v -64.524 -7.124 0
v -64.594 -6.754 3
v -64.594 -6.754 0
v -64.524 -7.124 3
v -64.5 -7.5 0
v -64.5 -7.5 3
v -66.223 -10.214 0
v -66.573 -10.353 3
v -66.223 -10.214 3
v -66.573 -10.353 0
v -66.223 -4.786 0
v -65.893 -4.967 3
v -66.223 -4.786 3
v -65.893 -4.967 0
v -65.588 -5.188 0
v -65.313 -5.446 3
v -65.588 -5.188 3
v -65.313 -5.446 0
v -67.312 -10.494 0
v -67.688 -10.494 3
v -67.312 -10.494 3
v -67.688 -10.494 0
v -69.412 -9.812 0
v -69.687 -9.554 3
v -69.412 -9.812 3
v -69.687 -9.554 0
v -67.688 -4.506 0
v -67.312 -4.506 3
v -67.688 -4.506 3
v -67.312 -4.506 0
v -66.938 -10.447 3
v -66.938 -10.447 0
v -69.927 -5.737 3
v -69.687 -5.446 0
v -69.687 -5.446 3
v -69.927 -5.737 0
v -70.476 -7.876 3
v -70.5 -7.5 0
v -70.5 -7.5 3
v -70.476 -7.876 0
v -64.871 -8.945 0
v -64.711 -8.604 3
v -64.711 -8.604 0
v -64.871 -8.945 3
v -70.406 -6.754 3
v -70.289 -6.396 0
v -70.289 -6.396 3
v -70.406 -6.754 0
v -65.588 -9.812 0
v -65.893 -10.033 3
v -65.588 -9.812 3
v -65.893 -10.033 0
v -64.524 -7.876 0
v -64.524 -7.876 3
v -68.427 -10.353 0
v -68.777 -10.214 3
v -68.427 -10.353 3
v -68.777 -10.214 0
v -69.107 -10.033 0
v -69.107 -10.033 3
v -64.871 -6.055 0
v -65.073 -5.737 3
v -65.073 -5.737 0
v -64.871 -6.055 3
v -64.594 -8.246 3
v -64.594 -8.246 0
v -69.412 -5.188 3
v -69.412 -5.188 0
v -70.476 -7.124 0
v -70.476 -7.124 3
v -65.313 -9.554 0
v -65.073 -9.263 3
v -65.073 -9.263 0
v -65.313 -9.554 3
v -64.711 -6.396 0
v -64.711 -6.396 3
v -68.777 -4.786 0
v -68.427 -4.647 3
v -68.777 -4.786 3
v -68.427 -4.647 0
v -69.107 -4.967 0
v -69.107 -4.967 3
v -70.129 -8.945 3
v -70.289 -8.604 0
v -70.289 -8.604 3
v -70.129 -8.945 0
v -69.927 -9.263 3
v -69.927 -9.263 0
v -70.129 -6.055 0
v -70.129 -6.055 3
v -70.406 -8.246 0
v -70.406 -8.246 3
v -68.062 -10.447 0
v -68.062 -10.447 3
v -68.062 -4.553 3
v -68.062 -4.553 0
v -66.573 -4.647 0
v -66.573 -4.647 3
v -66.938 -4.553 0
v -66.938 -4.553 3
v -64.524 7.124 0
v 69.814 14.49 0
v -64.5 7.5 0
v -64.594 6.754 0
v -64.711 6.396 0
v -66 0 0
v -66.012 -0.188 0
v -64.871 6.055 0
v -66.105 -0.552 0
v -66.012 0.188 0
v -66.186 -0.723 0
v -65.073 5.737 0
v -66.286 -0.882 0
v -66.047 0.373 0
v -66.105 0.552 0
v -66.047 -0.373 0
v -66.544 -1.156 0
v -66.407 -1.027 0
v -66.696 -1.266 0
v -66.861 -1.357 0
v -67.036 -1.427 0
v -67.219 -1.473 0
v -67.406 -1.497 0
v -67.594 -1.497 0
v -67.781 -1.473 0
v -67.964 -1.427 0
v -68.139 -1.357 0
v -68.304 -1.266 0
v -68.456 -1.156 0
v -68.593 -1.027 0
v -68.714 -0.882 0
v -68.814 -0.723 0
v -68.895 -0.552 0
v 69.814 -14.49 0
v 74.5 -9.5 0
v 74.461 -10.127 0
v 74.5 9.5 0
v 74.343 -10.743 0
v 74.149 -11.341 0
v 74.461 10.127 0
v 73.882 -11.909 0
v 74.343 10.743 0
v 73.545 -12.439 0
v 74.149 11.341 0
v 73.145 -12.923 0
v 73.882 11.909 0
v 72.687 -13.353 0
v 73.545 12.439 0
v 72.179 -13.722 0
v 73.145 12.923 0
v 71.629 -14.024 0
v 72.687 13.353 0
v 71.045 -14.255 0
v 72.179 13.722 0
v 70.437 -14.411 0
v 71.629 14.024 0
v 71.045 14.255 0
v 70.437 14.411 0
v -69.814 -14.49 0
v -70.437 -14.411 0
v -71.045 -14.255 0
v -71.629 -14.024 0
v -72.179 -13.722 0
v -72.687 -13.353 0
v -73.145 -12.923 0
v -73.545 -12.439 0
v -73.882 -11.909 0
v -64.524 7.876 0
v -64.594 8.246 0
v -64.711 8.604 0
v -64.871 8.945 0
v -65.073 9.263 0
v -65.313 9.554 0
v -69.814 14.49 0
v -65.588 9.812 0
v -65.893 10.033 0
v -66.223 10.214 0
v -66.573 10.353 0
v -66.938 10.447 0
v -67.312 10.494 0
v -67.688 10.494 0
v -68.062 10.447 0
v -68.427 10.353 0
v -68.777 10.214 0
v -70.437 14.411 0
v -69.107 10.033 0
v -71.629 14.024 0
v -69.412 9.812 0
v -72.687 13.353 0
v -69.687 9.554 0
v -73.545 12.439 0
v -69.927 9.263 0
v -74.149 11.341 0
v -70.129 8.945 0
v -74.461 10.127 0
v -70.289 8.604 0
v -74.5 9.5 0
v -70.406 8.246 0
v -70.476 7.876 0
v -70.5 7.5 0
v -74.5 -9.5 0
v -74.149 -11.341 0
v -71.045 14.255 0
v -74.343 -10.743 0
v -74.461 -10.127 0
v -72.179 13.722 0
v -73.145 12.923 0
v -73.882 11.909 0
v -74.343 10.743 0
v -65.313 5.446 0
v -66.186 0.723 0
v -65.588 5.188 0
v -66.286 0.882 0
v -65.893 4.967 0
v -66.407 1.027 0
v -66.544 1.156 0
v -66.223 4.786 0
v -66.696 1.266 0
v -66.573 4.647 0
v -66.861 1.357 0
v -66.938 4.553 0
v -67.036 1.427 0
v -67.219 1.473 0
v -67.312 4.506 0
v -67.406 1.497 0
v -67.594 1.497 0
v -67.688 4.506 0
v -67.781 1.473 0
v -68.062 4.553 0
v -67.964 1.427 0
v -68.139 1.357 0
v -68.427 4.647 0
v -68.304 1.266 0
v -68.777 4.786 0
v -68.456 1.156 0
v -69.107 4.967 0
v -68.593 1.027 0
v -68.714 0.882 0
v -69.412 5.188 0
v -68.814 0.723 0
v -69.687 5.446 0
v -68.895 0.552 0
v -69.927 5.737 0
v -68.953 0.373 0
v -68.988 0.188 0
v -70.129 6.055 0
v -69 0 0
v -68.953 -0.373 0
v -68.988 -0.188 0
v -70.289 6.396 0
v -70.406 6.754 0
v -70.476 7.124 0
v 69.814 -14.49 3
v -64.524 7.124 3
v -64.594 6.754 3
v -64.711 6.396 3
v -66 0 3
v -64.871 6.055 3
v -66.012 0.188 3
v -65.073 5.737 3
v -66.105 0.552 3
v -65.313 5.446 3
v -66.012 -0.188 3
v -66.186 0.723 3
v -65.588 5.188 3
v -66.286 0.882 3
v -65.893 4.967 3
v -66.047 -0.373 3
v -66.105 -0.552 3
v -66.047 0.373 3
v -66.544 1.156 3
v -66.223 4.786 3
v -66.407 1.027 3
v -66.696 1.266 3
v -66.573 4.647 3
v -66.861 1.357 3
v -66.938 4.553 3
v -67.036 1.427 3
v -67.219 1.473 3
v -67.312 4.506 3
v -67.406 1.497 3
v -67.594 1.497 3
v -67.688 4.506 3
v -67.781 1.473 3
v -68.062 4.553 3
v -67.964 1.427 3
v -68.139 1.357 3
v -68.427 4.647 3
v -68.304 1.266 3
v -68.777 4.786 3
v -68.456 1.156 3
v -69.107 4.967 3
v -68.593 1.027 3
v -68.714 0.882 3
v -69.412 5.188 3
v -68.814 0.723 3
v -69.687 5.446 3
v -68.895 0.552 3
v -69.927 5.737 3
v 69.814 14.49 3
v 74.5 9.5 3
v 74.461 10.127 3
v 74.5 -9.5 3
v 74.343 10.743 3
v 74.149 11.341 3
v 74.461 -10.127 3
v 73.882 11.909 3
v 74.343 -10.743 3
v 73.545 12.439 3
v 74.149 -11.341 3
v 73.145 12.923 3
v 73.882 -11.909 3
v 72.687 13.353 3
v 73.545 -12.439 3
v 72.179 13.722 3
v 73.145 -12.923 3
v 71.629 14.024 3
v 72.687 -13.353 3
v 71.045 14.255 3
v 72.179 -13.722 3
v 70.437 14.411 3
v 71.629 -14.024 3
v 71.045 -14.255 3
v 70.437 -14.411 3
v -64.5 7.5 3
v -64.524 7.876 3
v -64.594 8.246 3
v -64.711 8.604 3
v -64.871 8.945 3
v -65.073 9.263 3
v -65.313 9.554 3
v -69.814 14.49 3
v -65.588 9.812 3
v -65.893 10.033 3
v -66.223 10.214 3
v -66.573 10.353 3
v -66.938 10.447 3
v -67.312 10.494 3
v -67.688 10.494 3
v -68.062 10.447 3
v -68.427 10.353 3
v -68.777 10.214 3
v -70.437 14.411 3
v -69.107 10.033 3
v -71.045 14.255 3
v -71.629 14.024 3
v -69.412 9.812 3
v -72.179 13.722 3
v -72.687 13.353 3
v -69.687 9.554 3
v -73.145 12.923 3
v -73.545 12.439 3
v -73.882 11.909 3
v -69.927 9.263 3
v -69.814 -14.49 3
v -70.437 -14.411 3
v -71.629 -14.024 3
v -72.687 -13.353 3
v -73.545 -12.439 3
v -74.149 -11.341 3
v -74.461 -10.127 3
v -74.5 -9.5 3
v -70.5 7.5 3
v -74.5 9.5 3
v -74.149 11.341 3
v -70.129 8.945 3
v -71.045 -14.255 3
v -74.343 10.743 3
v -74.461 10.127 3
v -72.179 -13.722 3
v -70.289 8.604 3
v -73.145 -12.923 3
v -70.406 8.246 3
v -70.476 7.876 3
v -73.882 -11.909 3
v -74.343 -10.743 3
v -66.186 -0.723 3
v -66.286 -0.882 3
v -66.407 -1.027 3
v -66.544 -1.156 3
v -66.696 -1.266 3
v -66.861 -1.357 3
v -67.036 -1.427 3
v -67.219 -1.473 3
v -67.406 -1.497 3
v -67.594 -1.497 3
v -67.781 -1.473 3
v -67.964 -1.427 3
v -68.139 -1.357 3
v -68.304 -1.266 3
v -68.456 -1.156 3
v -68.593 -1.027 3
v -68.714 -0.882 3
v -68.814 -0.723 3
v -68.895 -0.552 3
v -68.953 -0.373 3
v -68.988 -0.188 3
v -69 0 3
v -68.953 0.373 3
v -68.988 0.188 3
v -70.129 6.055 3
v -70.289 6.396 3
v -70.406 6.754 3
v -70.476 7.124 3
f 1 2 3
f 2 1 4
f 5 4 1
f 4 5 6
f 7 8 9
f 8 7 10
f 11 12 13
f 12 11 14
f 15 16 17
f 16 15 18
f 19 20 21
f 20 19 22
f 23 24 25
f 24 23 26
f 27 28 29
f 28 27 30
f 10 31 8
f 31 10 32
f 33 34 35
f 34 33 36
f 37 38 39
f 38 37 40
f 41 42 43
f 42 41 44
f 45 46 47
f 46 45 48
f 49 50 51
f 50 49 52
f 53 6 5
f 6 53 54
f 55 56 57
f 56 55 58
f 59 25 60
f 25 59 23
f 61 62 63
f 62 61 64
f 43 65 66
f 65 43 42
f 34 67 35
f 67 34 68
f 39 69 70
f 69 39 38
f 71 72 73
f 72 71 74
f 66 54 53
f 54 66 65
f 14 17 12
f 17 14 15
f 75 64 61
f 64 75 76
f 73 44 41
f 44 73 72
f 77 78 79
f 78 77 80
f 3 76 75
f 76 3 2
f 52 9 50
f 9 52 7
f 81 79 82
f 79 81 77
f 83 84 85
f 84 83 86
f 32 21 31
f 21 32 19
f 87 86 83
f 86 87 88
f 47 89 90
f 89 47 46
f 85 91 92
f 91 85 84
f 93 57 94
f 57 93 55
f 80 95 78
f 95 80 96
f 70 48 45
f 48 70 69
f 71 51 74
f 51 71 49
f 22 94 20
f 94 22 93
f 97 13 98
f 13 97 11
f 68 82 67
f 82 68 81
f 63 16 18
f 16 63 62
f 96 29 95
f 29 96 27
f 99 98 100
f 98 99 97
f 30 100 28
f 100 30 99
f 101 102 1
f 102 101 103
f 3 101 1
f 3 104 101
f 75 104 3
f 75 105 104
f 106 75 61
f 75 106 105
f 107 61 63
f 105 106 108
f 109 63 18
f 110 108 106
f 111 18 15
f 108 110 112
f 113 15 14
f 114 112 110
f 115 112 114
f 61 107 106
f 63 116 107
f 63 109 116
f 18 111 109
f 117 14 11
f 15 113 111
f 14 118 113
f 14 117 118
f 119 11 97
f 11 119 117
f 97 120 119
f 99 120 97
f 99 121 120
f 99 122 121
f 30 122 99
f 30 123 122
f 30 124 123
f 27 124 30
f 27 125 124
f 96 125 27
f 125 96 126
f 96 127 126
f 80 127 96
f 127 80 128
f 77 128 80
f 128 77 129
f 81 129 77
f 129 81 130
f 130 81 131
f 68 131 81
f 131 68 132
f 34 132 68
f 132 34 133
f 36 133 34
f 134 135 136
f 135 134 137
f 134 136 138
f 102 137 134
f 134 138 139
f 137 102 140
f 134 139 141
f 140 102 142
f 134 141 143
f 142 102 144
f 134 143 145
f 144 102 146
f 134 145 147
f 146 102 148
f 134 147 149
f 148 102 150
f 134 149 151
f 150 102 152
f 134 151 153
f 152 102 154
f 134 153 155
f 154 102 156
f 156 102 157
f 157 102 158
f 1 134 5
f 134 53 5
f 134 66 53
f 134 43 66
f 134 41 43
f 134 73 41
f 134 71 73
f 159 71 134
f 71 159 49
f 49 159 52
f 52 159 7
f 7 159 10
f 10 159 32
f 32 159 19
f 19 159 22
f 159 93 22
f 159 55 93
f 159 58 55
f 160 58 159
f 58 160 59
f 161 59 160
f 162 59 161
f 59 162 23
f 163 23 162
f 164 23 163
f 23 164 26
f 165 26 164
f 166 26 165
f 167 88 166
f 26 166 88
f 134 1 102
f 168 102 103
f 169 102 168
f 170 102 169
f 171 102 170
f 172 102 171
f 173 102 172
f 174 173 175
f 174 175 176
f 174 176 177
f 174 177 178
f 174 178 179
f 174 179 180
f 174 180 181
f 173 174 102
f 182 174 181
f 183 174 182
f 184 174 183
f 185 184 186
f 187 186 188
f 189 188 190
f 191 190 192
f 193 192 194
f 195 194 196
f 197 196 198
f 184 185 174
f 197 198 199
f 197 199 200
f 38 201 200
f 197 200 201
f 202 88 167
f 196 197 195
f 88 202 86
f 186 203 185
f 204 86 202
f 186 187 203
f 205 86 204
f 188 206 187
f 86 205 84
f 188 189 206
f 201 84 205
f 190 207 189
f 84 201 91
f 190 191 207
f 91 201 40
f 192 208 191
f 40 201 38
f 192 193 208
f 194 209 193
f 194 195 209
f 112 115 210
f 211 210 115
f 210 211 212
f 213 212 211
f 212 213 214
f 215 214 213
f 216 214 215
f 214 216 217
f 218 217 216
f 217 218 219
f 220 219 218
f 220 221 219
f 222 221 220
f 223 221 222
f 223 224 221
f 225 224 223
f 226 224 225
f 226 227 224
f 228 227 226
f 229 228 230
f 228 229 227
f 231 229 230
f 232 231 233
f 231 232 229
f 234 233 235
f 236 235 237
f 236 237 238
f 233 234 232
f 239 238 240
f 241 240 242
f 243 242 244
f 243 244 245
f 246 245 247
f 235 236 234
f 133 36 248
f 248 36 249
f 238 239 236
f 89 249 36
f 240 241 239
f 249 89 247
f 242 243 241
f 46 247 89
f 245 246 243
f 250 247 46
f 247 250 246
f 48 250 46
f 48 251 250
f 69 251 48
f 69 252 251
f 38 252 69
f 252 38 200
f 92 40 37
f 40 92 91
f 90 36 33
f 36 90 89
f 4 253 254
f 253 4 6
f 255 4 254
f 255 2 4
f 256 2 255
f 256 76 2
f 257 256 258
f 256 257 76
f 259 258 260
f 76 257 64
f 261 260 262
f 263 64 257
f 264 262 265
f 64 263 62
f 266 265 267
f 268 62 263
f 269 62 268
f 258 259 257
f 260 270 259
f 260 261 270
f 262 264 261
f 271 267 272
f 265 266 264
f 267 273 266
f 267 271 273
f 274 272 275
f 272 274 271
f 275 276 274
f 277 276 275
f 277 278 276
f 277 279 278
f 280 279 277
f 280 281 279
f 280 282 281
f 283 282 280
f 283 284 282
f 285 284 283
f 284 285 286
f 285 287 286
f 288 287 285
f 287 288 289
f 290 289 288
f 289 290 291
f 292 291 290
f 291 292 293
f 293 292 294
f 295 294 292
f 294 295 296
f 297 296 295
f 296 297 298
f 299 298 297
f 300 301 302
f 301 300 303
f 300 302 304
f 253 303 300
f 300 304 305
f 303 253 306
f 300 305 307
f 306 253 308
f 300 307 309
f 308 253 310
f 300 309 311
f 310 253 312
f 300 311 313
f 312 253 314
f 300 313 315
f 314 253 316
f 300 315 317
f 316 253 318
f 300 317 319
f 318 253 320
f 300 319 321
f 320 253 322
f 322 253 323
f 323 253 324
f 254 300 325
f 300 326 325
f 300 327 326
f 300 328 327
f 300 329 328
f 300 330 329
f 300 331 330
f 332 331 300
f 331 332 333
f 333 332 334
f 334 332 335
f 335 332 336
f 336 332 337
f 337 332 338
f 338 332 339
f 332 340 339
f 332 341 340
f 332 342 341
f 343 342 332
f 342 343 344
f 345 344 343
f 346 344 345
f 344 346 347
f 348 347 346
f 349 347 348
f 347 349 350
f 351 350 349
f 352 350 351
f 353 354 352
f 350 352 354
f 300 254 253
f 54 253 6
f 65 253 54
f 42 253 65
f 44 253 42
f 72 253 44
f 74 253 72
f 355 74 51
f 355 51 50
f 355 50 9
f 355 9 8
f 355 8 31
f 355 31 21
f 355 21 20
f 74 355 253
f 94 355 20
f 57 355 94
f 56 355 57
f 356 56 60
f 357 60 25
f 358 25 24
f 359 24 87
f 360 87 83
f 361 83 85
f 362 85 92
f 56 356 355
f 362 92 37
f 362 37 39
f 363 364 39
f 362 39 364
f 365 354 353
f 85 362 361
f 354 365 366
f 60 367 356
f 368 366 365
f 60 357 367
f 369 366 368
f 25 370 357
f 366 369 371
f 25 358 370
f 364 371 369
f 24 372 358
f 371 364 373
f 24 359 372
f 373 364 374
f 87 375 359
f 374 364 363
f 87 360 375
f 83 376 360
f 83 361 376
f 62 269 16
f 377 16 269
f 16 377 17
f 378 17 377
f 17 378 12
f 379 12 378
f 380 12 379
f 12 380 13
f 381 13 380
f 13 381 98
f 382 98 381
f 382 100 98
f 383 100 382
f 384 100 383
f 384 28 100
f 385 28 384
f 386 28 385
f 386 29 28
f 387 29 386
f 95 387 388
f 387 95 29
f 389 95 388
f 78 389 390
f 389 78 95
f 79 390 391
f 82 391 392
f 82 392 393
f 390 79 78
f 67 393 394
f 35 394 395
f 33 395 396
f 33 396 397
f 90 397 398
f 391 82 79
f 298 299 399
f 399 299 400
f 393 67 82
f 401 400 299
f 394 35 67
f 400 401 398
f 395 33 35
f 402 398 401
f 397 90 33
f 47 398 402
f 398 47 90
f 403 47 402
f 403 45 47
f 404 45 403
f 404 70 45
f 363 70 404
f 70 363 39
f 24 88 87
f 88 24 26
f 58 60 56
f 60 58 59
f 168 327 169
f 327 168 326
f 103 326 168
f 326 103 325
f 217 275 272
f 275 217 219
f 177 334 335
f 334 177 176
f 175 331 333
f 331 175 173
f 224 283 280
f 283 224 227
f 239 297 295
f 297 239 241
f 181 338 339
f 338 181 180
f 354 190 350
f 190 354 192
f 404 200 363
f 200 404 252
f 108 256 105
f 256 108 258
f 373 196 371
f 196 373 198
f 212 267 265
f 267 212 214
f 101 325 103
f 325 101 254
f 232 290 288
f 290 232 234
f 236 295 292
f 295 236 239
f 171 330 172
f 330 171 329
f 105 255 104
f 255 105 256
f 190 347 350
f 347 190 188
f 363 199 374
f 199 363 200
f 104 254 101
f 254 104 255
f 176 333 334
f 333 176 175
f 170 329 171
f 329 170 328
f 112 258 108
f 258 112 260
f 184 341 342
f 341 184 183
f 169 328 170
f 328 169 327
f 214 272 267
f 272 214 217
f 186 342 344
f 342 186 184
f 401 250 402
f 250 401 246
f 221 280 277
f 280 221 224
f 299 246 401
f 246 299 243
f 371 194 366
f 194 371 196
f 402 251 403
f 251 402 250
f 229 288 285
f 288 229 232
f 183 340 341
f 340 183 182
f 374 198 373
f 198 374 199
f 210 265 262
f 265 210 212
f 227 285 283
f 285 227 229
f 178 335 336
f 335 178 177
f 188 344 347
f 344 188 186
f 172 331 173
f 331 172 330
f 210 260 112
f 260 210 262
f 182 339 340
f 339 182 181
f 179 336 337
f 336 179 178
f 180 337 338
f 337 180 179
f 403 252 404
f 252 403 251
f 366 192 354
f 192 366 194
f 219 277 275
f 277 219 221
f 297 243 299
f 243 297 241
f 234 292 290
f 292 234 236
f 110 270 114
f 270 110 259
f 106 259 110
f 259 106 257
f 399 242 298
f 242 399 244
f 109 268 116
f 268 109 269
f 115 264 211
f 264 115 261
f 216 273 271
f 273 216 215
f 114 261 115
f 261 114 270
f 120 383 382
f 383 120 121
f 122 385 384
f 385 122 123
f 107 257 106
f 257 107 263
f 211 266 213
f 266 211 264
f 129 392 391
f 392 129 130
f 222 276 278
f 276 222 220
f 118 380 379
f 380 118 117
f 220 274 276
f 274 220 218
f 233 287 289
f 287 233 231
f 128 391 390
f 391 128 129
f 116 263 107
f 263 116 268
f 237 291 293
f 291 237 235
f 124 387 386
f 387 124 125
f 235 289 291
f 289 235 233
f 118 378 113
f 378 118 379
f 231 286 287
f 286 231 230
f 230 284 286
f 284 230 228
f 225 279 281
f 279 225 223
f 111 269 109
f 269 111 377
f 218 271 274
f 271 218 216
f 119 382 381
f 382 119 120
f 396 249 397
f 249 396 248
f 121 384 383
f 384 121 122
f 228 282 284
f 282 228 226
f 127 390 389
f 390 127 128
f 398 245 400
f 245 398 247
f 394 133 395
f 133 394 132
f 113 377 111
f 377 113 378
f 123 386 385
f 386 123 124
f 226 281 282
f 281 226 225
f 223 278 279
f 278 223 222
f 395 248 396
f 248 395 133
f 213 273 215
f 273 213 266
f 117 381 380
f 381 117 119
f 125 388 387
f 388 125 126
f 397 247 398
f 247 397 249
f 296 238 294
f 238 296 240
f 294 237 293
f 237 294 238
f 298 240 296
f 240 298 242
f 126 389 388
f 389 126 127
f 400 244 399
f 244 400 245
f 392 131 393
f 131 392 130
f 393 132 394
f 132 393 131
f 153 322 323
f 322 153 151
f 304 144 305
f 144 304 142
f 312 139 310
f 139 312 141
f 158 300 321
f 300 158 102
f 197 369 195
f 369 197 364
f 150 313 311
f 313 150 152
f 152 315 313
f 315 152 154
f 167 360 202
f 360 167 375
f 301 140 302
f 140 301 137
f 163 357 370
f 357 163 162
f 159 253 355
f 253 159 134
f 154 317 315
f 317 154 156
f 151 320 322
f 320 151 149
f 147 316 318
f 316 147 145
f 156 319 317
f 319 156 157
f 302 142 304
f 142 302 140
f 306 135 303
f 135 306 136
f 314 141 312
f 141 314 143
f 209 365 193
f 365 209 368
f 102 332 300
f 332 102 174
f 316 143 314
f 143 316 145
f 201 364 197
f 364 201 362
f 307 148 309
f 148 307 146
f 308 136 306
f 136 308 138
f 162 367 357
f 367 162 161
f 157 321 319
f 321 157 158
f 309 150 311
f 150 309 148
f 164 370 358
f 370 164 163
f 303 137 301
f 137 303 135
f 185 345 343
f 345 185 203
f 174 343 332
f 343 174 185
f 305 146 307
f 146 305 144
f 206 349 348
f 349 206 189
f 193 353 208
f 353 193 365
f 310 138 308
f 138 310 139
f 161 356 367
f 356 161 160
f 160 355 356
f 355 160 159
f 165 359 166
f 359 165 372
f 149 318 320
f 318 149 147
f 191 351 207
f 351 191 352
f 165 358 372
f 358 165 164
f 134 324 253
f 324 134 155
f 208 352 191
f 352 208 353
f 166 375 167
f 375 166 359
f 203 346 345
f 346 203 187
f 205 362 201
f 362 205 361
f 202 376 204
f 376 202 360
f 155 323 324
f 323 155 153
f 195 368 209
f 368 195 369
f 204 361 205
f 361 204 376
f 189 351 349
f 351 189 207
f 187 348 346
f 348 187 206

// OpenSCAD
$fn = 50;


difference() {
	union() {
		hull() {
			translate(v = [-69.5000000000, 9.5000000000, 0]) {
				cylinder(h = 3, r = 5);
			}
			translate(v = [69.5000000000, 9.5000000000, 0]) {
				cylinder(h = 3, r = 5);
			}
			translate(v = [-69.5000000000, -9.5000000000, 0]) {
				cylinder(h = 3, r = 5);
			}
			translate(v = [69.5000000000, -9.5000000000, 0]) {
				cylinder(h = 3, r = 5);
			}
		}
	}
	union() {
		translate(v = [-67.5000000000, -7.5000000000, 0]) {
			cylinder(h = 3, r = 3.0000000000);
		}
		translate(v = [-67.5000000000, 7.5000000000, 0]) {
			cylinder(h = 3, r = 3.0000000000);
		}
		translate(v = [-67.5000000000, -7.5000000000, 0]) {
			cylinder(h = 3, r = 1.5000000000);
		}
		translate(v = [-67.5000000000, 0.0000000000, 0]) {
			cylinder(h = 3, r = 1.5000000000);
		}
		translate(v = [-67.5000000000, 7.5000000000, 0]) {
			cylinder(h = 3, r = 1.5000000000);
		}
		translate(v = [-67.5000000000, -7.5000000000, 0]) {
			cylinder(h = 3, r = 1.5000000000);
		}
		translate(v = [-67.5000000000, 0.0000000000, 0]) {
			cylinder(h = 3, r = 1.5000000000);
		}
		translate(v = [-67.5000000000, 7.5000000000, 0]) {
			cylinder(h = 3, r = 1.5000000000);
		}
		translate(v = [-67.5000000000, -7.5000000000, 0]) {
			cylinder(h = 3, r = 1.5000000000);
		}
		translate(v = [-67.5000000000, 0.0000000000, 0]) {
			cylinder(h = 3, r = 1.5000000000);
		}
		translate(v = [-67.5000000000, 7.5000000000, 0]) {
			cylinder(h = 3, r = 1.5000000000);
		}
	}
}
